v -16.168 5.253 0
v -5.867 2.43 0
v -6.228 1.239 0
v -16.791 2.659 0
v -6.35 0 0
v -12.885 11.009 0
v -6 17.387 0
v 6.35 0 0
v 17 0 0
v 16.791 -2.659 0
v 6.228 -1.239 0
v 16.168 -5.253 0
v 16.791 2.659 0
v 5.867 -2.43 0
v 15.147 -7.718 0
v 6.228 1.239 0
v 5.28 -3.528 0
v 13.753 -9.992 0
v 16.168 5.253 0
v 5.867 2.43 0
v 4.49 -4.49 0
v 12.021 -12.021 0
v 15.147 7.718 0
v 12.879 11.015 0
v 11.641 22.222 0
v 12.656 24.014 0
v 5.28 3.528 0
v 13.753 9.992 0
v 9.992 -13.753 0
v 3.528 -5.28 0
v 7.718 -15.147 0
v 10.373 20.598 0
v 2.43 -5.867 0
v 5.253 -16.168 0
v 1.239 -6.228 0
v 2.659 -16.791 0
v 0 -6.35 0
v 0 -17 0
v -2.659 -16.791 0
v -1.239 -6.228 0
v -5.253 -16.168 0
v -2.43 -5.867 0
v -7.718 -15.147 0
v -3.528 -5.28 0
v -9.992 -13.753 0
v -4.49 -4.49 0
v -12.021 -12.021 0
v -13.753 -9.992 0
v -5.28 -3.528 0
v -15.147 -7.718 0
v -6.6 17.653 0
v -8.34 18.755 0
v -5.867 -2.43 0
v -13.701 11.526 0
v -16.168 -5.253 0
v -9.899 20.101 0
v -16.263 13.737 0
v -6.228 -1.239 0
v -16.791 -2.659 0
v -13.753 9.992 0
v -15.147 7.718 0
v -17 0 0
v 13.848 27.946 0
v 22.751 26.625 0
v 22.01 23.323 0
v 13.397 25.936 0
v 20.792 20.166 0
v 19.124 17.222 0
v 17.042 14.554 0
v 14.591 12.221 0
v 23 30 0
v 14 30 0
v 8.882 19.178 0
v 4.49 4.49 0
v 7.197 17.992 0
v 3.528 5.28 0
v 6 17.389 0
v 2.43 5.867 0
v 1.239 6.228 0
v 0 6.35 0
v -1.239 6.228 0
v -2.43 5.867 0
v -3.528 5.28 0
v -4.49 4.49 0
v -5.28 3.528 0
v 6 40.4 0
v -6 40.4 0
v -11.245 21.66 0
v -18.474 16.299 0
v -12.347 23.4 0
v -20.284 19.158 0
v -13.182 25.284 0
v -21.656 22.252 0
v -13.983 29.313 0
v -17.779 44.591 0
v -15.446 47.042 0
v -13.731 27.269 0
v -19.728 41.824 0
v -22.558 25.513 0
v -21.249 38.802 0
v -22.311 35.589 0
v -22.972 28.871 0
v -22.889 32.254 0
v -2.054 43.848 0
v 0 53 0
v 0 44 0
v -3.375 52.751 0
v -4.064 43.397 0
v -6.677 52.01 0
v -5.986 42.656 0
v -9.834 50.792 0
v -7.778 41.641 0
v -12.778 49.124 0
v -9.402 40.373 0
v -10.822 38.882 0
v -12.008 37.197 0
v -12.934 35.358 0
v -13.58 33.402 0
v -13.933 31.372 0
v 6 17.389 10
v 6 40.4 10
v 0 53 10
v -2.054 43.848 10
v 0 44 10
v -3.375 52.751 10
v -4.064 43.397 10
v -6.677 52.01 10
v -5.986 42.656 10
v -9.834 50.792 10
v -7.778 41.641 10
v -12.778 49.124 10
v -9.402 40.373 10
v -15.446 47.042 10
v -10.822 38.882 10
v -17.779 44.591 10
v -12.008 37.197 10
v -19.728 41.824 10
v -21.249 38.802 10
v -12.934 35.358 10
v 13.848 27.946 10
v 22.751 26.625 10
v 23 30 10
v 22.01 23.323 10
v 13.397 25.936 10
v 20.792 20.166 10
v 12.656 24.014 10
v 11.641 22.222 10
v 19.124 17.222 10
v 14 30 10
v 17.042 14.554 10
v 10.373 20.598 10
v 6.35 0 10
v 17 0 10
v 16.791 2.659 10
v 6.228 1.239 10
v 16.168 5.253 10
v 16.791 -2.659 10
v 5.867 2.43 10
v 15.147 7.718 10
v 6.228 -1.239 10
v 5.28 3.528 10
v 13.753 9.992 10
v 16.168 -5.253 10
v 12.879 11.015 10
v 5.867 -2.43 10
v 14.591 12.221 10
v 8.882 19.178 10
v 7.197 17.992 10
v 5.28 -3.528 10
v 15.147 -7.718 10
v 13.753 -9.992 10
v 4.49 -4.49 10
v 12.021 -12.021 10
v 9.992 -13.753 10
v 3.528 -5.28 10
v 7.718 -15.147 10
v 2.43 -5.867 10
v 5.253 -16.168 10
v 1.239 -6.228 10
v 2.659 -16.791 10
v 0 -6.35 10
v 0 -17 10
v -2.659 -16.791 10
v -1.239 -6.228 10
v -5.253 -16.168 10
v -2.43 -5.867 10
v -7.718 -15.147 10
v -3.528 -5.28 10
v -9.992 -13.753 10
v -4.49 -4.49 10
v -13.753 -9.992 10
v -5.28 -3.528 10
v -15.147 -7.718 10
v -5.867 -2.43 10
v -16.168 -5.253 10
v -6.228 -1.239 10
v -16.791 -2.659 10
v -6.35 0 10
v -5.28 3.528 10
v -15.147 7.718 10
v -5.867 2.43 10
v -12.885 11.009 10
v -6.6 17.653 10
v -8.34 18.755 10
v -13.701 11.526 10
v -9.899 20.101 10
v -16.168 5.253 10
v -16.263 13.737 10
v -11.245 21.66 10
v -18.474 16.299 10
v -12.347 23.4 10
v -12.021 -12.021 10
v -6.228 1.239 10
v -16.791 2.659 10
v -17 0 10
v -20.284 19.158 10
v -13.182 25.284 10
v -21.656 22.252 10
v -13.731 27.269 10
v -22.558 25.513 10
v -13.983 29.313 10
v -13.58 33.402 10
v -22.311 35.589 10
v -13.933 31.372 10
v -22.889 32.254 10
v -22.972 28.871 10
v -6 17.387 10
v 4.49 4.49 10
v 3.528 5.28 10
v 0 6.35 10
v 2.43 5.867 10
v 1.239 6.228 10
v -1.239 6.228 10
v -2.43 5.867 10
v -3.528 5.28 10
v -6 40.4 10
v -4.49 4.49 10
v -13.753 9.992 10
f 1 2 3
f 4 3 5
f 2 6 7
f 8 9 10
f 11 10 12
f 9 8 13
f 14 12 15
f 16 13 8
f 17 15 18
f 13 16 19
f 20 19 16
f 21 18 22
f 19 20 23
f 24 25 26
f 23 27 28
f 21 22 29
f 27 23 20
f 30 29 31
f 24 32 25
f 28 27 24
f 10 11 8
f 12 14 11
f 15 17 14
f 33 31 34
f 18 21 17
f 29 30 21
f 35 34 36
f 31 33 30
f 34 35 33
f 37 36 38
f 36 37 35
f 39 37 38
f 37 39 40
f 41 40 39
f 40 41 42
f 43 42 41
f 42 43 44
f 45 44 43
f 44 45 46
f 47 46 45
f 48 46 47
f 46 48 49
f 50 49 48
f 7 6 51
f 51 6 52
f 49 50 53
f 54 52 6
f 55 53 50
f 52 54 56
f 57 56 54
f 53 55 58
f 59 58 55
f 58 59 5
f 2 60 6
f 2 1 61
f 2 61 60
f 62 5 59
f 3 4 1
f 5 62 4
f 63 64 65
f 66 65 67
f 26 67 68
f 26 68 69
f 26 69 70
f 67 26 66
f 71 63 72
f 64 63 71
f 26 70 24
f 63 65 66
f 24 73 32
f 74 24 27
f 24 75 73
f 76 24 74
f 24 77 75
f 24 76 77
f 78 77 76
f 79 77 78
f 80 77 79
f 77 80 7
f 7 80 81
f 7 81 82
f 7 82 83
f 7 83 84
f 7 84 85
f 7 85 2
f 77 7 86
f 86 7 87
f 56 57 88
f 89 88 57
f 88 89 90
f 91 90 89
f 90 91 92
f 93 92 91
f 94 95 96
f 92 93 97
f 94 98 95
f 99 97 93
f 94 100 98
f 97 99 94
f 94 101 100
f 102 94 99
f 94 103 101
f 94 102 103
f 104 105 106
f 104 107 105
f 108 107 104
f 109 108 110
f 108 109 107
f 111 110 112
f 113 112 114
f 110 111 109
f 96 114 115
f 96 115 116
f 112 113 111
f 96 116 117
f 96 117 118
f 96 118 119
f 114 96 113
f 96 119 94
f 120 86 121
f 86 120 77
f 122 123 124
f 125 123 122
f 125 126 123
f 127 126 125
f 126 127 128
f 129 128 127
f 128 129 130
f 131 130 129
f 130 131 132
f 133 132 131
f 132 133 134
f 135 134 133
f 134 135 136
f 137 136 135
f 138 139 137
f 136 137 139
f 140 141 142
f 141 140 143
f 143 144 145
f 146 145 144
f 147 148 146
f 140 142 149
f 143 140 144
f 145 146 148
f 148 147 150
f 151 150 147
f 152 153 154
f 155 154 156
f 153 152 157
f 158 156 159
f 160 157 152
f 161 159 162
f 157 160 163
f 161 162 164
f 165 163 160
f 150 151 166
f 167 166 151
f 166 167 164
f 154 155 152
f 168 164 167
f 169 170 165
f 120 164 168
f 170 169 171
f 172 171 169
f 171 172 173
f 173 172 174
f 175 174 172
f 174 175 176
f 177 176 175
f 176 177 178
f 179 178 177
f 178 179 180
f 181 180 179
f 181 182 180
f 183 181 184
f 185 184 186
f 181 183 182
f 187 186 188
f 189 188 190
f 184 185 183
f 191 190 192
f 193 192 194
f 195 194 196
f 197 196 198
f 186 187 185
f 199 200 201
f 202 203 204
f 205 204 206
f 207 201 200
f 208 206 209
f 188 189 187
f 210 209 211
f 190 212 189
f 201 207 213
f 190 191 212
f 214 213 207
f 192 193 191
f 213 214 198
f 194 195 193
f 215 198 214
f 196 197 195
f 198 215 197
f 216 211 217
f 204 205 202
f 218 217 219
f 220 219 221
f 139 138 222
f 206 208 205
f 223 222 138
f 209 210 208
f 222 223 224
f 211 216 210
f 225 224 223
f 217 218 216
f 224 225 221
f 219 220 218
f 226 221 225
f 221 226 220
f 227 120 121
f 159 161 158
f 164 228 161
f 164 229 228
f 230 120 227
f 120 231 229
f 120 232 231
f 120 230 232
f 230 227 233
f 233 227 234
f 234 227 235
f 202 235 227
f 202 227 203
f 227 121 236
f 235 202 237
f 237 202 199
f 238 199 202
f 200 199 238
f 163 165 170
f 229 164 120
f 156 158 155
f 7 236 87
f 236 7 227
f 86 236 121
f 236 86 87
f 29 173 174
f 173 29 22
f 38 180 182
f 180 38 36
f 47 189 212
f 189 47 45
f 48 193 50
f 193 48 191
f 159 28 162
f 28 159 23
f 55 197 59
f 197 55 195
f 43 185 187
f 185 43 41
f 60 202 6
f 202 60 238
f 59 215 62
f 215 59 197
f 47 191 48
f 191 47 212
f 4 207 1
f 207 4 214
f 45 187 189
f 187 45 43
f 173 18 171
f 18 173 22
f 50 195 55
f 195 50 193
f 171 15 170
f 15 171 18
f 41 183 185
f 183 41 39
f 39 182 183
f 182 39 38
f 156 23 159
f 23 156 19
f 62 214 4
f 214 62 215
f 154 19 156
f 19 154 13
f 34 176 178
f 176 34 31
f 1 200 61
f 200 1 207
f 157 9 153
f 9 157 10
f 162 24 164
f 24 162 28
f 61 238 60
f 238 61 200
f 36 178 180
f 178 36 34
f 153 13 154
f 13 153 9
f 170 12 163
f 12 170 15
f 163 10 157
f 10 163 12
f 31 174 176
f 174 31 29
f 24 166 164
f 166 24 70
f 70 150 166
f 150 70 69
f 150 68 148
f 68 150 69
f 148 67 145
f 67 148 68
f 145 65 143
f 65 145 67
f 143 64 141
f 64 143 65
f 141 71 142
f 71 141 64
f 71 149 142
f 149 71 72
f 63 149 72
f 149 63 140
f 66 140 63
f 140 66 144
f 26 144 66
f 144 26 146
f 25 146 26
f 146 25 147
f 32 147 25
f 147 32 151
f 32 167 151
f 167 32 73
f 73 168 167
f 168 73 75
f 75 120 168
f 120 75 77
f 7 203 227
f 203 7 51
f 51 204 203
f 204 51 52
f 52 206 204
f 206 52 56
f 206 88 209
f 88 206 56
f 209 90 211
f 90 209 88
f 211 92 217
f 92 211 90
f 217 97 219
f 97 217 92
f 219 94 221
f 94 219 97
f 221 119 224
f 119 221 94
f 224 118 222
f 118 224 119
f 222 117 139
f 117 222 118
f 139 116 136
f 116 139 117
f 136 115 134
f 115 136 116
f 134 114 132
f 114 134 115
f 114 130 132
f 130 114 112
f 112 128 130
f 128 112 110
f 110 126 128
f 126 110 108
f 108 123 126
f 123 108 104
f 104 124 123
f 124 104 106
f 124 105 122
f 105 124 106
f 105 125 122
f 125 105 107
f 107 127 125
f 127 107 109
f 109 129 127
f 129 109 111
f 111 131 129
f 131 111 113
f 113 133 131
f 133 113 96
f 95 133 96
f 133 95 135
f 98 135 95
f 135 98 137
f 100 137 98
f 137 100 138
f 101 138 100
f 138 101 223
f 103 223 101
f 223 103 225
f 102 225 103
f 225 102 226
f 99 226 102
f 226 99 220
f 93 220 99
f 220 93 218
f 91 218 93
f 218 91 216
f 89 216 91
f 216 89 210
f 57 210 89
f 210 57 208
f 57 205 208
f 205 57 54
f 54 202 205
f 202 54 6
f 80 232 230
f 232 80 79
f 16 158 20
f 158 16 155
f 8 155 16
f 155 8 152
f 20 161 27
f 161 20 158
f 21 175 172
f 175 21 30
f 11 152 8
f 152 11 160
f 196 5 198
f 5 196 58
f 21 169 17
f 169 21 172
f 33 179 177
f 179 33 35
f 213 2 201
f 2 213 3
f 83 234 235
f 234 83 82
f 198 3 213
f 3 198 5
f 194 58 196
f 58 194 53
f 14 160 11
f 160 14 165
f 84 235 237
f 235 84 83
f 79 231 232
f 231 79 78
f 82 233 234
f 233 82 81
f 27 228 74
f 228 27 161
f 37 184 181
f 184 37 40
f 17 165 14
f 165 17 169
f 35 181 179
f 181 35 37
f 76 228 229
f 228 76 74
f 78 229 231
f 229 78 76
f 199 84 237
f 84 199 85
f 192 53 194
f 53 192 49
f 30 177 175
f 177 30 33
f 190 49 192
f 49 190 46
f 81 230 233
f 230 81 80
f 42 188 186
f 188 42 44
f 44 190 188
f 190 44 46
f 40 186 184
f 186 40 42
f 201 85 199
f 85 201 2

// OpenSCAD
$fn = 32;

// ----------------------------------------------------------------------
// Hook: 60 mm shank into a 14 mm curl, 10 mm thick
// ----------------------------------------------------------------------

// --- parameters (mm) ---
shank_len = 60;           // shank length from the boss centre
shank_w = 12;             // shank width
boss_d = 34;              // boss diameter
bore_d = 12.7;            // boss bore
curl_in = 14;             // curl inner radius
curl_out = 23;            // curl outer radius
curl_sweep = 270;         // curl sweep angle
hook_t = 10;              // hook thickness

shank_profile = [[-6, 40.4], [6, 40.4], [6, 15], [-6, 15]];
boss_profile = [[17, 0], [16.791, 2.659], [16.168, 5.253], [15.147, 7.718], [13.753, 9.992], [12.021, 12.021], [9.992, 13.753], [7.718, 15.147], [5.253, 16.168], [2.659, 16.791], [0, 17], [-2.659, 16.791], [-5.253, 16.168], [-7.718, 15.147], [-9.992, 13.753], [-12.021, 12.021], [-13.753, 9.992], [-15.147, 7.718], [-16.168, 5.253], [-16.791, 2.659], [-17, 0], [-16.791, -2.659], [-16.168, -5.253], [-15.147, -7.718], [-13.753, -9.992], [-12.021, -12.021], [-9.992, -13.753], [-7.718, -15.147], [-5.253, -16.168], [-2.659, -16.791], [0, -17], [2.659, -16.791], [5.253, -16.168], [7.718, -15.147], [9.992, -13.753], [12.021, -12.021], [13.753, -9.992], [15.147, -7.718], [16.168, -5.253], [16.791, -2.659]];
curl_profile = [[0, 53], [-3.375, 52.751], [-6.677, 52.01], [-9.834, 50.792], [-12.778, 49.124], [-15.446, 47.042], [-17.779, 44.591], [-19.728, 41.824], [-21.249, 38.802], [-22.311, 35.589], [-22.889, 32.254], [-22.972, 28.871], [-22.558, 25.513], [-21.656, 22.252], [-20.284, 19.158], [-18.474, 16.299], [-16.263, 13.737], [-13.701, 11.526], [-10.842, 9.716], [-7.748, 8.344], [-4.487, 7.442], [-1.129, 7.028], [2.254, 7.111], [5.589, 7.689], [8.802, 8.751], [11.824, 10.272], [14.591, 12.221], [17.042, 14.554], [19.124, 17.222], [20.792, 20.166], [22.01, 23.323], [22.751, 26.625], [23, 30], [14, 30], [13.848, 27.946], [13.397, 25.936], [12.656, 24.014], [11.641, 22.222], [10.373, 20.598], [8.882, 19.178], [7.197, 17.992], [5.358, 17.066], [3.402, 16.42], [1.372, 16.067], [-0.687, 16.017], [-2.731, 16.269], [-4.716, 16.818], [-6.6, 17.653], [-8.34, 18.755], [-9.899, 20.101], [-11.245, 21.66], [-12.347, 23.4], [-13.182, 25.284], [-13.731, 27.269], [-13.983, 29.313], [-13.933, 31.372], [-13.58, 33.402], [-12.934, 35.358], [-12.008, 37.197], [-10.822, 38.882], [-9.402, 40.373], [-7.778, 41.641], [-5.986, 42.656], [-4.064, 43.397], [-2.054, 43.848], [0, 44]];

difference() {
  union() {
    /* three overlapping outlines: shank, boss and the smooth curl */
    linear_extrude(height = hook_t) polygon(shank_profile);
    linear_extrude(height = hook_t) polygon(boss_profile);
    linear_extrude(height = hook_t) polygon(curl_profile);
  }
  translate([0, 0, -2.5]) cylinder(h = hook_t + 5, d = bore_d);
}
